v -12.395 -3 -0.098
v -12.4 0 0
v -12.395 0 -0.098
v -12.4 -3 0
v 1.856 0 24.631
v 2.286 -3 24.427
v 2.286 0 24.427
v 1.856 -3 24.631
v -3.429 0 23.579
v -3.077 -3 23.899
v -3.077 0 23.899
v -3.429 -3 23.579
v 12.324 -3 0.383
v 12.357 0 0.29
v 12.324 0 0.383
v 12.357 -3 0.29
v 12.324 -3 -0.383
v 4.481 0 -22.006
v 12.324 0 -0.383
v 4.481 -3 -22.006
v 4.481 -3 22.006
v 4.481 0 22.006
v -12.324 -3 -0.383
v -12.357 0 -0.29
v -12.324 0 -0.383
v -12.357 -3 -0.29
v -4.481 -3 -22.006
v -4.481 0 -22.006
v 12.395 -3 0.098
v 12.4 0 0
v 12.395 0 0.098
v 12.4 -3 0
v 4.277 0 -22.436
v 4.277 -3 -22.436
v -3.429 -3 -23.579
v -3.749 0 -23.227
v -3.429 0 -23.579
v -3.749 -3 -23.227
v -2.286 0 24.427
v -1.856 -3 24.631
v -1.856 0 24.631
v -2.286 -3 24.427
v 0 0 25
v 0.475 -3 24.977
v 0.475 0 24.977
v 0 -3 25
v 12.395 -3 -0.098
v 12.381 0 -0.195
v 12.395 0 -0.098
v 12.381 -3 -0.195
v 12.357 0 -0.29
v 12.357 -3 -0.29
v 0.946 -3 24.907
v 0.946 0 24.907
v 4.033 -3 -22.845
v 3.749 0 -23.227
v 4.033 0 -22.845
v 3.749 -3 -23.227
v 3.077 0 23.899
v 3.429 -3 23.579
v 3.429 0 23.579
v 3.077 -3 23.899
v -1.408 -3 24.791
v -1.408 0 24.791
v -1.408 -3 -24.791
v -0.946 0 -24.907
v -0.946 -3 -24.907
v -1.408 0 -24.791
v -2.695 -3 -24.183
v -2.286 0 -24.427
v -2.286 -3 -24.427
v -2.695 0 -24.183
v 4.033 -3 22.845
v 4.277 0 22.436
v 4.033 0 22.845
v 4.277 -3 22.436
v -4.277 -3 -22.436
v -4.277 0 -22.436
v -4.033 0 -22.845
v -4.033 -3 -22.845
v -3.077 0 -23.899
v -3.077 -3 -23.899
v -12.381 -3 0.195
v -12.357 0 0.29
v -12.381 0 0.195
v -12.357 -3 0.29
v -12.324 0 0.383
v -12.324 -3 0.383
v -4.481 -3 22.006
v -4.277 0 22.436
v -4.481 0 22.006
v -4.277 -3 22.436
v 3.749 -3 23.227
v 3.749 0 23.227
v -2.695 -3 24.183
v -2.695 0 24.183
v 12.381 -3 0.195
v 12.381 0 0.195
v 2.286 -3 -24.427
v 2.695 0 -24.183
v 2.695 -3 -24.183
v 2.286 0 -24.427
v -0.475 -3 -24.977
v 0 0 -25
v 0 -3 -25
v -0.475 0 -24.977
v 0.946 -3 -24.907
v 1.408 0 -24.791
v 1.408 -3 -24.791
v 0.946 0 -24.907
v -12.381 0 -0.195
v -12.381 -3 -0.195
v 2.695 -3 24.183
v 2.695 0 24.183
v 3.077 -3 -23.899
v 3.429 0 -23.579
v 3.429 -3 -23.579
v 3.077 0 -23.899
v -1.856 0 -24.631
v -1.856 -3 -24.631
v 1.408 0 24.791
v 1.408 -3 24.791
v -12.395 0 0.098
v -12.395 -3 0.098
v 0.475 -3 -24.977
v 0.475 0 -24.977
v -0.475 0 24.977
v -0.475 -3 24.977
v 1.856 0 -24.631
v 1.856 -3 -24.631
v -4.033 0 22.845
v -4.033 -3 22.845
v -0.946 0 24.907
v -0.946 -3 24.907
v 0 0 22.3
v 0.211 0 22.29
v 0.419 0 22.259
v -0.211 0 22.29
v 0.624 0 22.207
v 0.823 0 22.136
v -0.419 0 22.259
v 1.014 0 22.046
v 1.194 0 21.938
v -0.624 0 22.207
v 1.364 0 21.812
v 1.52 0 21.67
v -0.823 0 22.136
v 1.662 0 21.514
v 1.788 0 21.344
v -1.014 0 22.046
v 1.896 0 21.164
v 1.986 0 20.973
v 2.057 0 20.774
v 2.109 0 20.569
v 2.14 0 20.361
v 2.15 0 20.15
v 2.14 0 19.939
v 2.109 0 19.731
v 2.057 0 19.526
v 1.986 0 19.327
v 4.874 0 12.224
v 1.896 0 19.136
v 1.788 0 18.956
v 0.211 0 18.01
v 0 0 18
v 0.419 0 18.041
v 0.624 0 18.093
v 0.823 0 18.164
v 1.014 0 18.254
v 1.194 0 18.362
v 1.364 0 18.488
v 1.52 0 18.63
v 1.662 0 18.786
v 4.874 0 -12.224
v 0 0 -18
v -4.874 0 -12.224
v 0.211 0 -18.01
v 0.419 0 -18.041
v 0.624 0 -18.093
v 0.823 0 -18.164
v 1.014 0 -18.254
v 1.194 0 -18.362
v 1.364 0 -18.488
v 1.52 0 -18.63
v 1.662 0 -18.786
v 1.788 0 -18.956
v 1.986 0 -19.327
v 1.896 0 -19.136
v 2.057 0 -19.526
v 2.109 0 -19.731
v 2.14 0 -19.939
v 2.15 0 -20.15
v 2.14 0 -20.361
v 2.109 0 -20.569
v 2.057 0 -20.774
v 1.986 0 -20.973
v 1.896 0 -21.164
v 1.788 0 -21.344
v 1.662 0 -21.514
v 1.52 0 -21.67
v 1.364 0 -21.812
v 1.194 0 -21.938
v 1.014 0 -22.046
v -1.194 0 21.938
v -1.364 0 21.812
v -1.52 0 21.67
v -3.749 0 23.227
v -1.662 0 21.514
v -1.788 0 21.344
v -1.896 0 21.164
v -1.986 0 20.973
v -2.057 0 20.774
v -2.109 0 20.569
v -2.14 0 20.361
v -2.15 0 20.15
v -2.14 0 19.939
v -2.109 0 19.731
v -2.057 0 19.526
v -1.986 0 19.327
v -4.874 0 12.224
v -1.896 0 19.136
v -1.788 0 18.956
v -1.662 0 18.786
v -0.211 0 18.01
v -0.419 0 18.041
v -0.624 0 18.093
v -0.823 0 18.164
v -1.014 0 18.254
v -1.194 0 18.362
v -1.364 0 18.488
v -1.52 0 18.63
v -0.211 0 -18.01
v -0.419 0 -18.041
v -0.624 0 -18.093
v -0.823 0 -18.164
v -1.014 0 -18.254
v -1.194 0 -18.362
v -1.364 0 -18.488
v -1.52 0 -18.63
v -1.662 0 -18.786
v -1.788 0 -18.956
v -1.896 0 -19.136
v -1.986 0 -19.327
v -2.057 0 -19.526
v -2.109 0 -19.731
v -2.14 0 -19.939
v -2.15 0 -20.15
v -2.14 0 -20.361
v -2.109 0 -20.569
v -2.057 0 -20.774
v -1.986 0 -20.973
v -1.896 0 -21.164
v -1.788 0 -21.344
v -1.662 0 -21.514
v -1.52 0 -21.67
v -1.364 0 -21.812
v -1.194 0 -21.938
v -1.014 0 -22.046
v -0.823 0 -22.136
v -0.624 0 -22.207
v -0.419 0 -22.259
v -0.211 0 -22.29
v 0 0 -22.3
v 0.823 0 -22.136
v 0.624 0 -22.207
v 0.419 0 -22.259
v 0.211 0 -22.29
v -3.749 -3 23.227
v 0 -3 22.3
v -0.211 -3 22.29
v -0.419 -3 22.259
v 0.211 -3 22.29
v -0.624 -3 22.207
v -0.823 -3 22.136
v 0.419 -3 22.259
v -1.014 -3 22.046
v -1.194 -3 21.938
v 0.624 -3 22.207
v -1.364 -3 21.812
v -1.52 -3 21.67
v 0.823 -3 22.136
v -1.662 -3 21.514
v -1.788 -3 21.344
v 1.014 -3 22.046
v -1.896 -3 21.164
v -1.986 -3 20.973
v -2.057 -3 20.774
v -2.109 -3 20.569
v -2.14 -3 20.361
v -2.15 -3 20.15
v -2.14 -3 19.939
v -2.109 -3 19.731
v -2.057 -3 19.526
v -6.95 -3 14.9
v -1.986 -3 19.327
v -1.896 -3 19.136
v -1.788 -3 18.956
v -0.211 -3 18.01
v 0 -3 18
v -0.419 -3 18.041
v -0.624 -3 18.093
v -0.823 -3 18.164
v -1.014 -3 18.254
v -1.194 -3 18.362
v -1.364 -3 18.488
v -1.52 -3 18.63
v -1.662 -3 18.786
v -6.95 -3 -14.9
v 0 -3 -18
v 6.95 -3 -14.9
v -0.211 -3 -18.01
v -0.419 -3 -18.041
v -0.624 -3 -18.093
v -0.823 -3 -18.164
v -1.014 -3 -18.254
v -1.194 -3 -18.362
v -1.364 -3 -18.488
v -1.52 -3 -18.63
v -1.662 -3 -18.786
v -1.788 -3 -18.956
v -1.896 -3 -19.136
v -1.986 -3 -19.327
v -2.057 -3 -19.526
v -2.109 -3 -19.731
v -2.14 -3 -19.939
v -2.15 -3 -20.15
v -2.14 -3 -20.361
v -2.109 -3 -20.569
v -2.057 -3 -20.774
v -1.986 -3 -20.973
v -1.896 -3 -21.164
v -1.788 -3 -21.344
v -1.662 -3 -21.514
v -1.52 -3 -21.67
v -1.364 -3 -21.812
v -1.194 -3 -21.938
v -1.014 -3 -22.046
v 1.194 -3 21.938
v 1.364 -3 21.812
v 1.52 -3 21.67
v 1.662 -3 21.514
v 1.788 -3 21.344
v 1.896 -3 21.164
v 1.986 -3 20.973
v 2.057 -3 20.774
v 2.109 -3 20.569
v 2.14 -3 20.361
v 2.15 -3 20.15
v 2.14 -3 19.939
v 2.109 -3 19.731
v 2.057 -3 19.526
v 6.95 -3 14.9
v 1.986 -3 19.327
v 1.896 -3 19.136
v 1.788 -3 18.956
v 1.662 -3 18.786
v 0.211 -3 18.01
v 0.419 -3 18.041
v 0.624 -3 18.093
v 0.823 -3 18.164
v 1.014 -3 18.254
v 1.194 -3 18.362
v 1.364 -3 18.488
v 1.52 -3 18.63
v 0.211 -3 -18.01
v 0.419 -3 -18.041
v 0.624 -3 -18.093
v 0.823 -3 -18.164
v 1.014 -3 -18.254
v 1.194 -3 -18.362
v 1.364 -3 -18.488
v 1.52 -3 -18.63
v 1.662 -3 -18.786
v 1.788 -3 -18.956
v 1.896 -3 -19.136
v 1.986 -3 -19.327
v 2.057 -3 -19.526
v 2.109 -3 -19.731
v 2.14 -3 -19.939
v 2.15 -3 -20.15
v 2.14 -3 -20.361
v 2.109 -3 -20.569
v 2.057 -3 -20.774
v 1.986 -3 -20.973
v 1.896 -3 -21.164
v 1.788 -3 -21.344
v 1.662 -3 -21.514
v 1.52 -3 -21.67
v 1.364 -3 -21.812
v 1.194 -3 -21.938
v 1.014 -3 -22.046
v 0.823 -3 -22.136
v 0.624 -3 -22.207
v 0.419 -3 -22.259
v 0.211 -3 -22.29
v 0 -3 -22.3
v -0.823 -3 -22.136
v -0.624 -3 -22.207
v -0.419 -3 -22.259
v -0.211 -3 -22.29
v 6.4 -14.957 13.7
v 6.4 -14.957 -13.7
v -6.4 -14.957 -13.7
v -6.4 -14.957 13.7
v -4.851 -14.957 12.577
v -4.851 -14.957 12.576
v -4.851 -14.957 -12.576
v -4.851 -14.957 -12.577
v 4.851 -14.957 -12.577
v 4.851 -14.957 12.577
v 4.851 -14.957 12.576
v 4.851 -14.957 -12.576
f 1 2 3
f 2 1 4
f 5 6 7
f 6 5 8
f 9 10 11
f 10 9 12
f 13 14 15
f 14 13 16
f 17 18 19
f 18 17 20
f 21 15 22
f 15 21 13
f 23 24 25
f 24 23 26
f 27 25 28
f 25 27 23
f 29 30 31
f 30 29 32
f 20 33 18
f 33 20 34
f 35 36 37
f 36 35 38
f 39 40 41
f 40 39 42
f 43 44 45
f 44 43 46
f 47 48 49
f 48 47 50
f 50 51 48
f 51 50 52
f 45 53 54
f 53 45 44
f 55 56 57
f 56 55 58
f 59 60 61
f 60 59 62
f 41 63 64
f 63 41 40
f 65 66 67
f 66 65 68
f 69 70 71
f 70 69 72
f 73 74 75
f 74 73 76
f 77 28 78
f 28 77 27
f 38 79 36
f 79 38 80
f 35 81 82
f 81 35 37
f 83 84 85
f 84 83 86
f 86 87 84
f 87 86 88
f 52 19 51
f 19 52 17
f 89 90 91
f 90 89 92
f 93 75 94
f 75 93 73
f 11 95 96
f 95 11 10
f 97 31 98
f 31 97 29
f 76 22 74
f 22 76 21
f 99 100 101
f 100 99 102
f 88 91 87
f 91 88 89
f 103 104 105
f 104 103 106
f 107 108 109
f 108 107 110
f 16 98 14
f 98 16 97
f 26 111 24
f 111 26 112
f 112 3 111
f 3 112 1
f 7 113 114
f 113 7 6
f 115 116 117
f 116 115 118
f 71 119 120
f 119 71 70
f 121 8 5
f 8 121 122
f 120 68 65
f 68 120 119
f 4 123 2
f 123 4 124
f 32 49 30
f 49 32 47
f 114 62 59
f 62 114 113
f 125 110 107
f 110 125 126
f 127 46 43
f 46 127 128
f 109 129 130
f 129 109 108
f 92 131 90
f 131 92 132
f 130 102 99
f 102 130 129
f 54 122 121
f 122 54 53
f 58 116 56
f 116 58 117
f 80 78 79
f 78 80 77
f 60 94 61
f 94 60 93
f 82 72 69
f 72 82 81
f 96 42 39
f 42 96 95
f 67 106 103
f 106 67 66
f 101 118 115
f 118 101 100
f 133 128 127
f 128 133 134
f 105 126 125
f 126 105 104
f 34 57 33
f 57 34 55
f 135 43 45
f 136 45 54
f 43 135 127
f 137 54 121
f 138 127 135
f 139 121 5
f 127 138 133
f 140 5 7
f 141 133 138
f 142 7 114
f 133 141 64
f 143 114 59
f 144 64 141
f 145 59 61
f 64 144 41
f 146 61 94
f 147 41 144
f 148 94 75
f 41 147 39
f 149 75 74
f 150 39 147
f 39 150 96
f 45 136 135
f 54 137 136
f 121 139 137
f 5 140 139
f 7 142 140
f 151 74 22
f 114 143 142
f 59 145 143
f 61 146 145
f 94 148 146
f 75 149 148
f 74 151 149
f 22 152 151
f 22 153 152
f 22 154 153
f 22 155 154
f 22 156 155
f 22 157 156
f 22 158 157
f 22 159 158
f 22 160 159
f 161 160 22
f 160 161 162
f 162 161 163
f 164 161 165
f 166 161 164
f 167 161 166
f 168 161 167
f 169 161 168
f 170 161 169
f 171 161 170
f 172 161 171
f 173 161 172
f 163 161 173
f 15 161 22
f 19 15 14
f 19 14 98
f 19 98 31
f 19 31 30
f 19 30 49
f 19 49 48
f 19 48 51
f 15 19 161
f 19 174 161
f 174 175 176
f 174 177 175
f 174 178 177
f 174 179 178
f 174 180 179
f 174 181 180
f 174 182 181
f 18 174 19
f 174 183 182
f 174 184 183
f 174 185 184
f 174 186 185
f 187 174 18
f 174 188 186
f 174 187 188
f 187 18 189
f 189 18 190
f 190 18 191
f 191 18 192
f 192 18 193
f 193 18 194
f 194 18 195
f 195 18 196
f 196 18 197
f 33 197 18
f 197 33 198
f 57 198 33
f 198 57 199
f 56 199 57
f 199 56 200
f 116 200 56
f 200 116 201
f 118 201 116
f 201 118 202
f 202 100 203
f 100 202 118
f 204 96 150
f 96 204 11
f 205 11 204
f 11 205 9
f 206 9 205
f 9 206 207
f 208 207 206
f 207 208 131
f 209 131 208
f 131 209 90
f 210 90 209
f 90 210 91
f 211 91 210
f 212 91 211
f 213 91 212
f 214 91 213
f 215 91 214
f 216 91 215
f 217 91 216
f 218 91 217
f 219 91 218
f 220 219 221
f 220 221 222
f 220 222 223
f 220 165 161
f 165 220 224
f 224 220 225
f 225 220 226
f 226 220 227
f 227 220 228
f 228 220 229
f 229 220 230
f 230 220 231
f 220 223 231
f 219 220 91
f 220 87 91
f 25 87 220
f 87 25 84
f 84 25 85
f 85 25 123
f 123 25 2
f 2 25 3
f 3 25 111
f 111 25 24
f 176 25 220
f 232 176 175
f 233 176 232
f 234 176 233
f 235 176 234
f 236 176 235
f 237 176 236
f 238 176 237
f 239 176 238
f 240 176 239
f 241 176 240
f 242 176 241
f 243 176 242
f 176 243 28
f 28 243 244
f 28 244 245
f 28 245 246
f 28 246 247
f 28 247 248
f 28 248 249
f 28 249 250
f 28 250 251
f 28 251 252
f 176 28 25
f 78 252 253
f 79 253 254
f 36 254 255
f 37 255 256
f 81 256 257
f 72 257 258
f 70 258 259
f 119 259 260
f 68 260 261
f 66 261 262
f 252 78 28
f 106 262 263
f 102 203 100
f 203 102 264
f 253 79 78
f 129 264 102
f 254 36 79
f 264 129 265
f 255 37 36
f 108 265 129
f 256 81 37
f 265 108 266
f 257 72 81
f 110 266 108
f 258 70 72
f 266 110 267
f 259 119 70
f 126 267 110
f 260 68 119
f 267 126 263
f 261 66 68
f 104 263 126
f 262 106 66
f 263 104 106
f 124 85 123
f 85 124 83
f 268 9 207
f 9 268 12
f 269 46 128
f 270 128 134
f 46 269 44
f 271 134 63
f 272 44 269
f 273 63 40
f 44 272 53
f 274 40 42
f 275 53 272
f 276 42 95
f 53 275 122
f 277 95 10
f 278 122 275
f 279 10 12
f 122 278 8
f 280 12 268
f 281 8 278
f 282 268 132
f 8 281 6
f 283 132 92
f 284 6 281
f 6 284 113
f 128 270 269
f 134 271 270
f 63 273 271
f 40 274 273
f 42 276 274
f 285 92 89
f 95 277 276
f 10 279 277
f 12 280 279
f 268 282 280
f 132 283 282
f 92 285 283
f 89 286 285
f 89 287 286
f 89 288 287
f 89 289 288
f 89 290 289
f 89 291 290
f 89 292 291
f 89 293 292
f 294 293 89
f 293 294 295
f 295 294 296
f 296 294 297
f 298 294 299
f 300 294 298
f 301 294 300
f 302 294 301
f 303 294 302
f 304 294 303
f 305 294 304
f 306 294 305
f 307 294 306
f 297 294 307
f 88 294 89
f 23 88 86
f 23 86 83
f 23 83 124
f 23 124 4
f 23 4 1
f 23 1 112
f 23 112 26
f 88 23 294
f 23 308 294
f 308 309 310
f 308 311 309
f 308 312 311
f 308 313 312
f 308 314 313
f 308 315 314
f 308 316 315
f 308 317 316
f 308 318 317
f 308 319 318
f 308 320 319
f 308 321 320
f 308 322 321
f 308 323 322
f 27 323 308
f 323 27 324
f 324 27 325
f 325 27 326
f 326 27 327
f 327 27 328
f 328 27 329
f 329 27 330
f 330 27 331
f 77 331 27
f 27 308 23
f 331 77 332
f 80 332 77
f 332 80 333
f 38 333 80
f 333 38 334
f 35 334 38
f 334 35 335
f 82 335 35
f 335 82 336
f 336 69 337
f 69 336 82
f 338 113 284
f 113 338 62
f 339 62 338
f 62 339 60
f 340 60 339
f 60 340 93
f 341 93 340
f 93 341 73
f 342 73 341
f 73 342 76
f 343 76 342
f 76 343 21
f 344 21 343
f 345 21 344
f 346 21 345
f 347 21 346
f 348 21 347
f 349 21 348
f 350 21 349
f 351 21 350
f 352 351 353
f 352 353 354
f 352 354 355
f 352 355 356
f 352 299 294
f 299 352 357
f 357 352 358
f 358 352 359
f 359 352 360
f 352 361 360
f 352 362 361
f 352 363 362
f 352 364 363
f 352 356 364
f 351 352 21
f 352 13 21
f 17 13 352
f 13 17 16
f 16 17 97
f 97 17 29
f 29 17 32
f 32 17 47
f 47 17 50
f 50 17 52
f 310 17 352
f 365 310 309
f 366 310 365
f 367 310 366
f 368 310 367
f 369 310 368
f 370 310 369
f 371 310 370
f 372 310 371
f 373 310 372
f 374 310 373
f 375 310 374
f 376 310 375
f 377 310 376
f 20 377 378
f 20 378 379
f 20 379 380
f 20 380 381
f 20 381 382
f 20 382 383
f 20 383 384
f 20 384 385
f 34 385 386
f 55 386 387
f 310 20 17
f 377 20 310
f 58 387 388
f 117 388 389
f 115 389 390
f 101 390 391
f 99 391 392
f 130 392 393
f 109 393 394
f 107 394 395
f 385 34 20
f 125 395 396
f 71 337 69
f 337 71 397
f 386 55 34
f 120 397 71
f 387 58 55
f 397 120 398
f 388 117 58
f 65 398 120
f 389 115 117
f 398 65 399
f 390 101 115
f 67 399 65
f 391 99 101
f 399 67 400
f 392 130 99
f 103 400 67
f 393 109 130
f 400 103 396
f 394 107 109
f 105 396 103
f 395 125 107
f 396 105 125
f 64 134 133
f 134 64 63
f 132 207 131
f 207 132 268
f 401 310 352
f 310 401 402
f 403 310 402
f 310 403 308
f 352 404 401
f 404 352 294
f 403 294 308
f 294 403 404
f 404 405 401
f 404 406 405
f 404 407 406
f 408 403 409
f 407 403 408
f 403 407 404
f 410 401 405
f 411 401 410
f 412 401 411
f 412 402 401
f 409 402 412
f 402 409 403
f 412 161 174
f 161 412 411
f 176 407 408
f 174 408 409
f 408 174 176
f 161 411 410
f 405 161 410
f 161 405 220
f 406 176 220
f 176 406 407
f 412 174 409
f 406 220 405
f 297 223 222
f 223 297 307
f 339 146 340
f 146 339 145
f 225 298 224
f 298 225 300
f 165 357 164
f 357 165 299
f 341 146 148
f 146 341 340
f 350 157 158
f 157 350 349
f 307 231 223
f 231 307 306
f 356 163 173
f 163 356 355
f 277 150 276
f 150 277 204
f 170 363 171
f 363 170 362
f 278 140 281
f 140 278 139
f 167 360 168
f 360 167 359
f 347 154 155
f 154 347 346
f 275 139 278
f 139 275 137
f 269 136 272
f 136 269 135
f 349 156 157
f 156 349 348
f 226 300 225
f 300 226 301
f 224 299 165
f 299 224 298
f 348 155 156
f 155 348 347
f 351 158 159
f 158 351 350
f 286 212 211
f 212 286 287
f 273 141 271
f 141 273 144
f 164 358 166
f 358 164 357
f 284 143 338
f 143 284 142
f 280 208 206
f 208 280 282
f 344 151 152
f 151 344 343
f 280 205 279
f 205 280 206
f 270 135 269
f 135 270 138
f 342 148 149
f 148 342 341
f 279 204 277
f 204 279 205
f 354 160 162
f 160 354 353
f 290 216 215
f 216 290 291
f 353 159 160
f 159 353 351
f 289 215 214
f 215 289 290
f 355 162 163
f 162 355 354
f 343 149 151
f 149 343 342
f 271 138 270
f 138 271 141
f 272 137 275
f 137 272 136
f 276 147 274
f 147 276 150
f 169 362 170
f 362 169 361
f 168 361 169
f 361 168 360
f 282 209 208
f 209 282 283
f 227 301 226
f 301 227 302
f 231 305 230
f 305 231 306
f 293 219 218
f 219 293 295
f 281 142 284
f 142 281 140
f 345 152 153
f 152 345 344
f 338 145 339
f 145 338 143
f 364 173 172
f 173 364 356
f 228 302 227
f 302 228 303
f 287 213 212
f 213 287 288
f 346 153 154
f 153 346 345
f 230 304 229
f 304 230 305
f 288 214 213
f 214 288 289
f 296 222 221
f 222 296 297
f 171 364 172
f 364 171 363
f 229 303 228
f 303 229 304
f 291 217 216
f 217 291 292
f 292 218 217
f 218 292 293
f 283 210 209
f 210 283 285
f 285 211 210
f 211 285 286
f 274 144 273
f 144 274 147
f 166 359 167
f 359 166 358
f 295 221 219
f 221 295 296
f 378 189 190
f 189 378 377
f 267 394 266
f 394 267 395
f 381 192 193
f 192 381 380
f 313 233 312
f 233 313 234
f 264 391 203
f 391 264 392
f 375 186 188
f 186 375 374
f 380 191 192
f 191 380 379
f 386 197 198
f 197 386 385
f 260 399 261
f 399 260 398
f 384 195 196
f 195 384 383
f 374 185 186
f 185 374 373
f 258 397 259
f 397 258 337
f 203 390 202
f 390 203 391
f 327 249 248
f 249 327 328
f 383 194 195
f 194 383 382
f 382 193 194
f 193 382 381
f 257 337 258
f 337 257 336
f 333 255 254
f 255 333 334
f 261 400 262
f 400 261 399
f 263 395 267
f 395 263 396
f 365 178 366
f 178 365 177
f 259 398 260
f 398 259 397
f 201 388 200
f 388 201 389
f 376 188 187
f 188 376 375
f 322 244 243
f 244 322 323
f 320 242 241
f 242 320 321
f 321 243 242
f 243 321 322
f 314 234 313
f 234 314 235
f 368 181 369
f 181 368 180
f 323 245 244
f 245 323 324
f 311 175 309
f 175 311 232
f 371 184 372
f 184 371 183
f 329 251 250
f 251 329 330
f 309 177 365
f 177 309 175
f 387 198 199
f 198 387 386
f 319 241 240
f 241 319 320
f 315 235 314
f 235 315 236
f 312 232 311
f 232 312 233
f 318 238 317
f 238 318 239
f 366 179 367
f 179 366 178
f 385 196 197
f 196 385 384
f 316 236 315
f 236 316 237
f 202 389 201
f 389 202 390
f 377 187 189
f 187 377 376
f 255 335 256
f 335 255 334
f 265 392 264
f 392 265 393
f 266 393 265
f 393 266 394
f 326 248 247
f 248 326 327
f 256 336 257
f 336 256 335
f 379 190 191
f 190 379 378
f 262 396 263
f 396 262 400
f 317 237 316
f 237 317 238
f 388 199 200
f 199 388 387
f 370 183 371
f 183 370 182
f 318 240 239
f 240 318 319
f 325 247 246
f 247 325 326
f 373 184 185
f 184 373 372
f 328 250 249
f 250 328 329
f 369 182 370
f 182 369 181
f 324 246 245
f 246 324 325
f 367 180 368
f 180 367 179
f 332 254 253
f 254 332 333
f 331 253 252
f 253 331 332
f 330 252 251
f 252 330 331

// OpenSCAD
// Hybrid refinement of the optimizer result.
// This version preserves the optimizer shell and only expands the back plate
// envelope enough to better match the measured width and height.
plate_width = 24.8;
plate_height = 50.0;
plate_thickness = 3.0;

frame_depth = 14.957;
frame_outer_width = 12.8;
frame_outer_height = 27.4;
frame_back_width = 13.9;
frame_back_height = 29.8;
frame_inner_front_width = 9.7;
frame_inner_front_height = 25.2;
frame_inner_back_width = 9.75;
frame_inner_back_height = 24.4;

lug_center_z = 20.15;
lug_outer_radius = 4.85;
lug_hole_radius = 2.15;

show_reference = false;
reference_offset_x = 32.0;

$fn = 64;

module back_plate_profile() {
    hull() {
        translate([0, lug_center_z]) circle(r = lug_outer_radius);
        translate([0, -lug_center_z]) circle(r = lug_outer_radius);
        translate([plate_width / 2 - 1, 0]) circle(r = 1);
        translate([-plate_width / 2 + 1, 0]) circle(r = 1);
    }
}

module back_plate() {
    translate([0, -plate_thickness, 0])
        rotate([-90, 0, 0])
            linear_extrude(height = plate_thickness)
                back_plate_profile();
}

module front_frame_shell() {
    hull() {
        translate([-frame_outer_width / 2, -frame_depth, -frame_outer_height / 2])
            cube([frame_outer_width, 0.02, frame_outer_height]);
        translate([-frame_back_width / 2, -plate_thickness, -frame_back_height / 2])
            cube([frame_back_width, 0.01, frame_back_height]);
    }
}

module front_opening_cut() {
    hull() {
        translate([-frame_inner_front_width / 2, -frame_depth - 1.0, -frame_inner_front_height / 2])
            cube([frame_inner_front_width, 0.01, frame_inner_front_height]);
        translate([-frame_inner_back_width / 2, 1.0, -frame_inner_back_height / 2])
            cube([frame_inner_back_width, 0.01, frame_inner_back_height]);
    }
}

module lug_hole(z_pos) {
    translate([0, -frame_depth - 1, z_pos])
        rotate([-90, 0, 0])
            cylinder(h = frame_depth + plate_thickness + 2, r = lug_hole_radius);
}

module reconstructed_part() {
    difference() {
        union() {
            back_plate();
            front_frame_shell();
        }
        front_opening_cut();
        lug_hole(lug_center_z);
        lug_hole(-lug_center_z);
    }
}

module original_reference() {
    import("../../../../base.stl");
}

reconstructed_part();

if (show_reference) {
    color([0.2, 0.6, 0.9, 0.45])
        translate([reference_offset_x, 0, 0])
            original_reference();
}
